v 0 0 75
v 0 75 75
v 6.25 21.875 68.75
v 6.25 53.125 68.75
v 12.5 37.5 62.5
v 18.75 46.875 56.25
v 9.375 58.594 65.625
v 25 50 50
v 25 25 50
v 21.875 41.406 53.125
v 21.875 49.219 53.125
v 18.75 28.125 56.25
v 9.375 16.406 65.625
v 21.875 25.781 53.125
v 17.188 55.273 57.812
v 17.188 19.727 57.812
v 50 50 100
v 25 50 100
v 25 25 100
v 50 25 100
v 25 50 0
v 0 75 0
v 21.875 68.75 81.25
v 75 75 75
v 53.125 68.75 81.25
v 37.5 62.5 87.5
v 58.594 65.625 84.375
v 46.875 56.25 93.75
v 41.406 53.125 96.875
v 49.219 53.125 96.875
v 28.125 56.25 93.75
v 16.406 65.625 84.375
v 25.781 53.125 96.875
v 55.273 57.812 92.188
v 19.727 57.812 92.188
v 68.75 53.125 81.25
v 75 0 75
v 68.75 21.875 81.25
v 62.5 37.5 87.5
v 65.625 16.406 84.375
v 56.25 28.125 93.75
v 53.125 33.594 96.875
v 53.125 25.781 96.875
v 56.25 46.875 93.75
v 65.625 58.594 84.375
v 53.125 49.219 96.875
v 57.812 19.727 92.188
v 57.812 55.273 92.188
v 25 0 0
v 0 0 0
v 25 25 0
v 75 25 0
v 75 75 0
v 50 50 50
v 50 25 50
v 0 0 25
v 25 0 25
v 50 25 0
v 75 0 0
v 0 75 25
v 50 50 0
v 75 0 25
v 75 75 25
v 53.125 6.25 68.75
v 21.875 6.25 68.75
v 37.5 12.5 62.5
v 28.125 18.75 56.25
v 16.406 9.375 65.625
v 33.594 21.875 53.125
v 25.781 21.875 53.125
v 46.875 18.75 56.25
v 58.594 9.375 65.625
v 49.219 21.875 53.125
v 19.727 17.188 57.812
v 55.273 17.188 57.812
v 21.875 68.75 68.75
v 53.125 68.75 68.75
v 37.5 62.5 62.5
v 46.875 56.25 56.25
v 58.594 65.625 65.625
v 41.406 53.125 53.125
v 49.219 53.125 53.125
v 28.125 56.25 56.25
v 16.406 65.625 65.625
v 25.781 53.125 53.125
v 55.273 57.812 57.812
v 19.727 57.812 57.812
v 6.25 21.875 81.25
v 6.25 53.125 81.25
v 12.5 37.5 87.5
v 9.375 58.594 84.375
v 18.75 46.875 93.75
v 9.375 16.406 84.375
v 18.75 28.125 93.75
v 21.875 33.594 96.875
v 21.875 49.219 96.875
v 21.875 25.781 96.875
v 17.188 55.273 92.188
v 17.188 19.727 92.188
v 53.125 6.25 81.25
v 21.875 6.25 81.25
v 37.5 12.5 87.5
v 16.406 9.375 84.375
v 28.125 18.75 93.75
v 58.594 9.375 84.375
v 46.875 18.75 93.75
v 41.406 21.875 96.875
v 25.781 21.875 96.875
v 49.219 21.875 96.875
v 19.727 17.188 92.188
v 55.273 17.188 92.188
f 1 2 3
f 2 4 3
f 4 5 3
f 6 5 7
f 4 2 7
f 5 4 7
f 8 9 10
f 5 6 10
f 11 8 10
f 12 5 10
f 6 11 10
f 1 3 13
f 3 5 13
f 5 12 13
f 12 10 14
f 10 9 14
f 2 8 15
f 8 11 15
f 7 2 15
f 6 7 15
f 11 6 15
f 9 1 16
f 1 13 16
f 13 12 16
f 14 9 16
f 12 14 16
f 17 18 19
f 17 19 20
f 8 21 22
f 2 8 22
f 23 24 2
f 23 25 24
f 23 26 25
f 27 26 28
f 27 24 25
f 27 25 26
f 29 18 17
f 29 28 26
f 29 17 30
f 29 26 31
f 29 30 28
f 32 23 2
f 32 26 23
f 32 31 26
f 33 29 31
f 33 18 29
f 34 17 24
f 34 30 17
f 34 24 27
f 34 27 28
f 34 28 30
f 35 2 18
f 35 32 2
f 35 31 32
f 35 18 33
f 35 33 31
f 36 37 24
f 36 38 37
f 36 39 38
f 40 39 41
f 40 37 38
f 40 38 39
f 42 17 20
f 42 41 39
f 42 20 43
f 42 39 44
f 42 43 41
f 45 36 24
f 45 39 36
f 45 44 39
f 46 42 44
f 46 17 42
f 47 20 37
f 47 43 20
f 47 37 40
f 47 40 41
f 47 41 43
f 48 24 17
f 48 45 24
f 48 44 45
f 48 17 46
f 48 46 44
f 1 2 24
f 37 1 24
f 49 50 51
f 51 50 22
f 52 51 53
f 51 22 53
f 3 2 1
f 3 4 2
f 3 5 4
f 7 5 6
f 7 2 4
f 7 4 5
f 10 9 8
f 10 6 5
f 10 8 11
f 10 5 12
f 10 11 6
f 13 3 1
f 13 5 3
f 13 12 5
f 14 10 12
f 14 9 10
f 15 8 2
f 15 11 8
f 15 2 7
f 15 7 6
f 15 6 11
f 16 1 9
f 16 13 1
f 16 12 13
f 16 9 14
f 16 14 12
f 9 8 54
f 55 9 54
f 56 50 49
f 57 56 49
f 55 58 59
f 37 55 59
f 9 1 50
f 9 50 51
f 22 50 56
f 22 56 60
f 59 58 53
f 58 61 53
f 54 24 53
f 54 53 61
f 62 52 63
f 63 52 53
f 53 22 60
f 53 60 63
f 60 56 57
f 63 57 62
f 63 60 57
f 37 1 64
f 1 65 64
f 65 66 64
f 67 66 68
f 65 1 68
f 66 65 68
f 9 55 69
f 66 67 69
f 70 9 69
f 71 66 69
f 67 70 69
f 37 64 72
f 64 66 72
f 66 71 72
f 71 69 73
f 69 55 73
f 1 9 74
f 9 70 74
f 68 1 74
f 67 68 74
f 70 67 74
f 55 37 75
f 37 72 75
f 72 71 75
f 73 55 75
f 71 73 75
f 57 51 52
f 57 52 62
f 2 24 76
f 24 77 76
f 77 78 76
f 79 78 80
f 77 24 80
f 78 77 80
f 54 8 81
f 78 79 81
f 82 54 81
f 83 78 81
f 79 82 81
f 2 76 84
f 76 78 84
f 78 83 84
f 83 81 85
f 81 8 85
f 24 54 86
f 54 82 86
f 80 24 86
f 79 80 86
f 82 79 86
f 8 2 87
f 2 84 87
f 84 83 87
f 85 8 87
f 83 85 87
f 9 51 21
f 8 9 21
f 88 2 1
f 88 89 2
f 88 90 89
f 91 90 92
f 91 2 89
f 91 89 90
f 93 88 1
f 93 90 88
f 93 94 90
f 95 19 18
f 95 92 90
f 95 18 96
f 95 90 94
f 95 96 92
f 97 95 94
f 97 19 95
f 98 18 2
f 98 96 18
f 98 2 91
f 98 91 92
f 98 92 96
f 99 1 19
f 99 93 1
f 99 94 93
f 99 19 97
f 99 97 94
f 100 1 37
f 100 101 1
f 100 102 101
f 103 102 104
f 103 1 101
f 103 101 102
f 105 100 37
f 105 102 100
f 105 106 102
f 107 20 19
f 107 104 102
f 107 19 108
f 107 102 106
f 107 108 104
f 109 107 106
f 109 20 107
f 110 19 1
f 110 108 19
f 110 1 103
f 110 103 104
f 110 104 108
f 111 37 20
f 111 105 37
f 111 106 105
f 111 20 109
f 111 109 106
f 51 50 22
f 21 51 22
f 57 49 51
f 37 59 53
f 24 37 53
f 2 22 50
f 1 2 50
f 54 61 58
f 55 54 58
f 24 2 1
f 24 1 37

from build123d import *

# Parameters (mm, degrees)
F5_W      = 75
F5_H      = 75
F6_W      = 25
F6_H      = 25
F8_W      = 25
F8_H      = 25
F11_REACH = 179.0579416042
F13_REACH = 179.0579416042
F0_W      = 75
F0_H      = 75
F14_DEPTH = 25
F16_START = 25
F16_DEPTH = 50


with BuildPart() as f7:
    # F5 (on offset) → F7 section 0
    with BuildSketch(Plane.XY.offset(75)):
        with Locations((37.5, 37.5)):
            Rectangle(F5_W, F5_H)
    # F6 (on offset) → F7 section 1
    with BuildSketch(Plane.XY.offset(100)):
        with Locations((37.5, 37.5)):
            Rectangle(F6_W, F6_H)
    loft()


with BuildPart() as f9:
    # F5 (on offset) → F9 section 0
    with BuildSketch(Plane.XY.offset(75)):
        with Locations((37.5, 37.5)):
            Rectangle(F5_W, F5_H)
    # F8 (on offset) → F9 section 1
    with BuildSketch(Plane.XY.offset(50)):
        with Locations((37.5, 37.5)):
            Rectangle(F8_W, F8_H)
    loft()

    f11_end = f9.faces().sort_by_distance((64.5833333333, 37.5, 64.5833333333))[0]
    # F10 (on Top) → F11 (join, up to a face of the model that its end follows)
    with BuildSketch(Plane.XY):
        Polygon((50, 25), (75, 0), (75, 75), (50, 50), align=None)
    f11_long = extrude(amount=F11_REACH, mode=Mode.PRIVATE)
    add(split(f11_long, bisect_by=f11_end, keep=Keep.TOP, mode=Mode.PRIVATE))


with BuildPart() as f13:
    f13_end = f9.part.faces().sort_by_distance((10.4166666667, 37.5, 64.5833333333))[0]
    # F12 (on Top) → F13 (new body, up to a face of F9 that its end follows)
    with BuildSketch(Plane.XY):
        Polygon((25, 50), (0, 75), (0, 0), (25, 25), align=None)
    f13_long = extrude(amount=F13_REACH, mode=Mode.PRIVATE)
    add(split(f13_long, bisect_by=f13_end, keep=Keep.TOP, mode=Mode.PRIVATE))


with BuildPart() as f14:
    # F0 (on Top) → F14 (new body)
    with BuildSketch(Plane.XY):
        with Locations((37.5, 37.5)):
            Rectangle(F0_W, F0_H)
    extrude(amount=F14_DEPTH)

    # F15 (on Right) → F16 (cut)
    with BuildSketch(Plane.YZ.offset(F16_START)):
        Polygon((25, 0), (0, 25), (0, 0), align=None)
    extrude(amount=F16_DEPTH, mode=Mode.SUBTRACT)


solid = Compound([f7.part, f9.part, f13.part, f14.part])
